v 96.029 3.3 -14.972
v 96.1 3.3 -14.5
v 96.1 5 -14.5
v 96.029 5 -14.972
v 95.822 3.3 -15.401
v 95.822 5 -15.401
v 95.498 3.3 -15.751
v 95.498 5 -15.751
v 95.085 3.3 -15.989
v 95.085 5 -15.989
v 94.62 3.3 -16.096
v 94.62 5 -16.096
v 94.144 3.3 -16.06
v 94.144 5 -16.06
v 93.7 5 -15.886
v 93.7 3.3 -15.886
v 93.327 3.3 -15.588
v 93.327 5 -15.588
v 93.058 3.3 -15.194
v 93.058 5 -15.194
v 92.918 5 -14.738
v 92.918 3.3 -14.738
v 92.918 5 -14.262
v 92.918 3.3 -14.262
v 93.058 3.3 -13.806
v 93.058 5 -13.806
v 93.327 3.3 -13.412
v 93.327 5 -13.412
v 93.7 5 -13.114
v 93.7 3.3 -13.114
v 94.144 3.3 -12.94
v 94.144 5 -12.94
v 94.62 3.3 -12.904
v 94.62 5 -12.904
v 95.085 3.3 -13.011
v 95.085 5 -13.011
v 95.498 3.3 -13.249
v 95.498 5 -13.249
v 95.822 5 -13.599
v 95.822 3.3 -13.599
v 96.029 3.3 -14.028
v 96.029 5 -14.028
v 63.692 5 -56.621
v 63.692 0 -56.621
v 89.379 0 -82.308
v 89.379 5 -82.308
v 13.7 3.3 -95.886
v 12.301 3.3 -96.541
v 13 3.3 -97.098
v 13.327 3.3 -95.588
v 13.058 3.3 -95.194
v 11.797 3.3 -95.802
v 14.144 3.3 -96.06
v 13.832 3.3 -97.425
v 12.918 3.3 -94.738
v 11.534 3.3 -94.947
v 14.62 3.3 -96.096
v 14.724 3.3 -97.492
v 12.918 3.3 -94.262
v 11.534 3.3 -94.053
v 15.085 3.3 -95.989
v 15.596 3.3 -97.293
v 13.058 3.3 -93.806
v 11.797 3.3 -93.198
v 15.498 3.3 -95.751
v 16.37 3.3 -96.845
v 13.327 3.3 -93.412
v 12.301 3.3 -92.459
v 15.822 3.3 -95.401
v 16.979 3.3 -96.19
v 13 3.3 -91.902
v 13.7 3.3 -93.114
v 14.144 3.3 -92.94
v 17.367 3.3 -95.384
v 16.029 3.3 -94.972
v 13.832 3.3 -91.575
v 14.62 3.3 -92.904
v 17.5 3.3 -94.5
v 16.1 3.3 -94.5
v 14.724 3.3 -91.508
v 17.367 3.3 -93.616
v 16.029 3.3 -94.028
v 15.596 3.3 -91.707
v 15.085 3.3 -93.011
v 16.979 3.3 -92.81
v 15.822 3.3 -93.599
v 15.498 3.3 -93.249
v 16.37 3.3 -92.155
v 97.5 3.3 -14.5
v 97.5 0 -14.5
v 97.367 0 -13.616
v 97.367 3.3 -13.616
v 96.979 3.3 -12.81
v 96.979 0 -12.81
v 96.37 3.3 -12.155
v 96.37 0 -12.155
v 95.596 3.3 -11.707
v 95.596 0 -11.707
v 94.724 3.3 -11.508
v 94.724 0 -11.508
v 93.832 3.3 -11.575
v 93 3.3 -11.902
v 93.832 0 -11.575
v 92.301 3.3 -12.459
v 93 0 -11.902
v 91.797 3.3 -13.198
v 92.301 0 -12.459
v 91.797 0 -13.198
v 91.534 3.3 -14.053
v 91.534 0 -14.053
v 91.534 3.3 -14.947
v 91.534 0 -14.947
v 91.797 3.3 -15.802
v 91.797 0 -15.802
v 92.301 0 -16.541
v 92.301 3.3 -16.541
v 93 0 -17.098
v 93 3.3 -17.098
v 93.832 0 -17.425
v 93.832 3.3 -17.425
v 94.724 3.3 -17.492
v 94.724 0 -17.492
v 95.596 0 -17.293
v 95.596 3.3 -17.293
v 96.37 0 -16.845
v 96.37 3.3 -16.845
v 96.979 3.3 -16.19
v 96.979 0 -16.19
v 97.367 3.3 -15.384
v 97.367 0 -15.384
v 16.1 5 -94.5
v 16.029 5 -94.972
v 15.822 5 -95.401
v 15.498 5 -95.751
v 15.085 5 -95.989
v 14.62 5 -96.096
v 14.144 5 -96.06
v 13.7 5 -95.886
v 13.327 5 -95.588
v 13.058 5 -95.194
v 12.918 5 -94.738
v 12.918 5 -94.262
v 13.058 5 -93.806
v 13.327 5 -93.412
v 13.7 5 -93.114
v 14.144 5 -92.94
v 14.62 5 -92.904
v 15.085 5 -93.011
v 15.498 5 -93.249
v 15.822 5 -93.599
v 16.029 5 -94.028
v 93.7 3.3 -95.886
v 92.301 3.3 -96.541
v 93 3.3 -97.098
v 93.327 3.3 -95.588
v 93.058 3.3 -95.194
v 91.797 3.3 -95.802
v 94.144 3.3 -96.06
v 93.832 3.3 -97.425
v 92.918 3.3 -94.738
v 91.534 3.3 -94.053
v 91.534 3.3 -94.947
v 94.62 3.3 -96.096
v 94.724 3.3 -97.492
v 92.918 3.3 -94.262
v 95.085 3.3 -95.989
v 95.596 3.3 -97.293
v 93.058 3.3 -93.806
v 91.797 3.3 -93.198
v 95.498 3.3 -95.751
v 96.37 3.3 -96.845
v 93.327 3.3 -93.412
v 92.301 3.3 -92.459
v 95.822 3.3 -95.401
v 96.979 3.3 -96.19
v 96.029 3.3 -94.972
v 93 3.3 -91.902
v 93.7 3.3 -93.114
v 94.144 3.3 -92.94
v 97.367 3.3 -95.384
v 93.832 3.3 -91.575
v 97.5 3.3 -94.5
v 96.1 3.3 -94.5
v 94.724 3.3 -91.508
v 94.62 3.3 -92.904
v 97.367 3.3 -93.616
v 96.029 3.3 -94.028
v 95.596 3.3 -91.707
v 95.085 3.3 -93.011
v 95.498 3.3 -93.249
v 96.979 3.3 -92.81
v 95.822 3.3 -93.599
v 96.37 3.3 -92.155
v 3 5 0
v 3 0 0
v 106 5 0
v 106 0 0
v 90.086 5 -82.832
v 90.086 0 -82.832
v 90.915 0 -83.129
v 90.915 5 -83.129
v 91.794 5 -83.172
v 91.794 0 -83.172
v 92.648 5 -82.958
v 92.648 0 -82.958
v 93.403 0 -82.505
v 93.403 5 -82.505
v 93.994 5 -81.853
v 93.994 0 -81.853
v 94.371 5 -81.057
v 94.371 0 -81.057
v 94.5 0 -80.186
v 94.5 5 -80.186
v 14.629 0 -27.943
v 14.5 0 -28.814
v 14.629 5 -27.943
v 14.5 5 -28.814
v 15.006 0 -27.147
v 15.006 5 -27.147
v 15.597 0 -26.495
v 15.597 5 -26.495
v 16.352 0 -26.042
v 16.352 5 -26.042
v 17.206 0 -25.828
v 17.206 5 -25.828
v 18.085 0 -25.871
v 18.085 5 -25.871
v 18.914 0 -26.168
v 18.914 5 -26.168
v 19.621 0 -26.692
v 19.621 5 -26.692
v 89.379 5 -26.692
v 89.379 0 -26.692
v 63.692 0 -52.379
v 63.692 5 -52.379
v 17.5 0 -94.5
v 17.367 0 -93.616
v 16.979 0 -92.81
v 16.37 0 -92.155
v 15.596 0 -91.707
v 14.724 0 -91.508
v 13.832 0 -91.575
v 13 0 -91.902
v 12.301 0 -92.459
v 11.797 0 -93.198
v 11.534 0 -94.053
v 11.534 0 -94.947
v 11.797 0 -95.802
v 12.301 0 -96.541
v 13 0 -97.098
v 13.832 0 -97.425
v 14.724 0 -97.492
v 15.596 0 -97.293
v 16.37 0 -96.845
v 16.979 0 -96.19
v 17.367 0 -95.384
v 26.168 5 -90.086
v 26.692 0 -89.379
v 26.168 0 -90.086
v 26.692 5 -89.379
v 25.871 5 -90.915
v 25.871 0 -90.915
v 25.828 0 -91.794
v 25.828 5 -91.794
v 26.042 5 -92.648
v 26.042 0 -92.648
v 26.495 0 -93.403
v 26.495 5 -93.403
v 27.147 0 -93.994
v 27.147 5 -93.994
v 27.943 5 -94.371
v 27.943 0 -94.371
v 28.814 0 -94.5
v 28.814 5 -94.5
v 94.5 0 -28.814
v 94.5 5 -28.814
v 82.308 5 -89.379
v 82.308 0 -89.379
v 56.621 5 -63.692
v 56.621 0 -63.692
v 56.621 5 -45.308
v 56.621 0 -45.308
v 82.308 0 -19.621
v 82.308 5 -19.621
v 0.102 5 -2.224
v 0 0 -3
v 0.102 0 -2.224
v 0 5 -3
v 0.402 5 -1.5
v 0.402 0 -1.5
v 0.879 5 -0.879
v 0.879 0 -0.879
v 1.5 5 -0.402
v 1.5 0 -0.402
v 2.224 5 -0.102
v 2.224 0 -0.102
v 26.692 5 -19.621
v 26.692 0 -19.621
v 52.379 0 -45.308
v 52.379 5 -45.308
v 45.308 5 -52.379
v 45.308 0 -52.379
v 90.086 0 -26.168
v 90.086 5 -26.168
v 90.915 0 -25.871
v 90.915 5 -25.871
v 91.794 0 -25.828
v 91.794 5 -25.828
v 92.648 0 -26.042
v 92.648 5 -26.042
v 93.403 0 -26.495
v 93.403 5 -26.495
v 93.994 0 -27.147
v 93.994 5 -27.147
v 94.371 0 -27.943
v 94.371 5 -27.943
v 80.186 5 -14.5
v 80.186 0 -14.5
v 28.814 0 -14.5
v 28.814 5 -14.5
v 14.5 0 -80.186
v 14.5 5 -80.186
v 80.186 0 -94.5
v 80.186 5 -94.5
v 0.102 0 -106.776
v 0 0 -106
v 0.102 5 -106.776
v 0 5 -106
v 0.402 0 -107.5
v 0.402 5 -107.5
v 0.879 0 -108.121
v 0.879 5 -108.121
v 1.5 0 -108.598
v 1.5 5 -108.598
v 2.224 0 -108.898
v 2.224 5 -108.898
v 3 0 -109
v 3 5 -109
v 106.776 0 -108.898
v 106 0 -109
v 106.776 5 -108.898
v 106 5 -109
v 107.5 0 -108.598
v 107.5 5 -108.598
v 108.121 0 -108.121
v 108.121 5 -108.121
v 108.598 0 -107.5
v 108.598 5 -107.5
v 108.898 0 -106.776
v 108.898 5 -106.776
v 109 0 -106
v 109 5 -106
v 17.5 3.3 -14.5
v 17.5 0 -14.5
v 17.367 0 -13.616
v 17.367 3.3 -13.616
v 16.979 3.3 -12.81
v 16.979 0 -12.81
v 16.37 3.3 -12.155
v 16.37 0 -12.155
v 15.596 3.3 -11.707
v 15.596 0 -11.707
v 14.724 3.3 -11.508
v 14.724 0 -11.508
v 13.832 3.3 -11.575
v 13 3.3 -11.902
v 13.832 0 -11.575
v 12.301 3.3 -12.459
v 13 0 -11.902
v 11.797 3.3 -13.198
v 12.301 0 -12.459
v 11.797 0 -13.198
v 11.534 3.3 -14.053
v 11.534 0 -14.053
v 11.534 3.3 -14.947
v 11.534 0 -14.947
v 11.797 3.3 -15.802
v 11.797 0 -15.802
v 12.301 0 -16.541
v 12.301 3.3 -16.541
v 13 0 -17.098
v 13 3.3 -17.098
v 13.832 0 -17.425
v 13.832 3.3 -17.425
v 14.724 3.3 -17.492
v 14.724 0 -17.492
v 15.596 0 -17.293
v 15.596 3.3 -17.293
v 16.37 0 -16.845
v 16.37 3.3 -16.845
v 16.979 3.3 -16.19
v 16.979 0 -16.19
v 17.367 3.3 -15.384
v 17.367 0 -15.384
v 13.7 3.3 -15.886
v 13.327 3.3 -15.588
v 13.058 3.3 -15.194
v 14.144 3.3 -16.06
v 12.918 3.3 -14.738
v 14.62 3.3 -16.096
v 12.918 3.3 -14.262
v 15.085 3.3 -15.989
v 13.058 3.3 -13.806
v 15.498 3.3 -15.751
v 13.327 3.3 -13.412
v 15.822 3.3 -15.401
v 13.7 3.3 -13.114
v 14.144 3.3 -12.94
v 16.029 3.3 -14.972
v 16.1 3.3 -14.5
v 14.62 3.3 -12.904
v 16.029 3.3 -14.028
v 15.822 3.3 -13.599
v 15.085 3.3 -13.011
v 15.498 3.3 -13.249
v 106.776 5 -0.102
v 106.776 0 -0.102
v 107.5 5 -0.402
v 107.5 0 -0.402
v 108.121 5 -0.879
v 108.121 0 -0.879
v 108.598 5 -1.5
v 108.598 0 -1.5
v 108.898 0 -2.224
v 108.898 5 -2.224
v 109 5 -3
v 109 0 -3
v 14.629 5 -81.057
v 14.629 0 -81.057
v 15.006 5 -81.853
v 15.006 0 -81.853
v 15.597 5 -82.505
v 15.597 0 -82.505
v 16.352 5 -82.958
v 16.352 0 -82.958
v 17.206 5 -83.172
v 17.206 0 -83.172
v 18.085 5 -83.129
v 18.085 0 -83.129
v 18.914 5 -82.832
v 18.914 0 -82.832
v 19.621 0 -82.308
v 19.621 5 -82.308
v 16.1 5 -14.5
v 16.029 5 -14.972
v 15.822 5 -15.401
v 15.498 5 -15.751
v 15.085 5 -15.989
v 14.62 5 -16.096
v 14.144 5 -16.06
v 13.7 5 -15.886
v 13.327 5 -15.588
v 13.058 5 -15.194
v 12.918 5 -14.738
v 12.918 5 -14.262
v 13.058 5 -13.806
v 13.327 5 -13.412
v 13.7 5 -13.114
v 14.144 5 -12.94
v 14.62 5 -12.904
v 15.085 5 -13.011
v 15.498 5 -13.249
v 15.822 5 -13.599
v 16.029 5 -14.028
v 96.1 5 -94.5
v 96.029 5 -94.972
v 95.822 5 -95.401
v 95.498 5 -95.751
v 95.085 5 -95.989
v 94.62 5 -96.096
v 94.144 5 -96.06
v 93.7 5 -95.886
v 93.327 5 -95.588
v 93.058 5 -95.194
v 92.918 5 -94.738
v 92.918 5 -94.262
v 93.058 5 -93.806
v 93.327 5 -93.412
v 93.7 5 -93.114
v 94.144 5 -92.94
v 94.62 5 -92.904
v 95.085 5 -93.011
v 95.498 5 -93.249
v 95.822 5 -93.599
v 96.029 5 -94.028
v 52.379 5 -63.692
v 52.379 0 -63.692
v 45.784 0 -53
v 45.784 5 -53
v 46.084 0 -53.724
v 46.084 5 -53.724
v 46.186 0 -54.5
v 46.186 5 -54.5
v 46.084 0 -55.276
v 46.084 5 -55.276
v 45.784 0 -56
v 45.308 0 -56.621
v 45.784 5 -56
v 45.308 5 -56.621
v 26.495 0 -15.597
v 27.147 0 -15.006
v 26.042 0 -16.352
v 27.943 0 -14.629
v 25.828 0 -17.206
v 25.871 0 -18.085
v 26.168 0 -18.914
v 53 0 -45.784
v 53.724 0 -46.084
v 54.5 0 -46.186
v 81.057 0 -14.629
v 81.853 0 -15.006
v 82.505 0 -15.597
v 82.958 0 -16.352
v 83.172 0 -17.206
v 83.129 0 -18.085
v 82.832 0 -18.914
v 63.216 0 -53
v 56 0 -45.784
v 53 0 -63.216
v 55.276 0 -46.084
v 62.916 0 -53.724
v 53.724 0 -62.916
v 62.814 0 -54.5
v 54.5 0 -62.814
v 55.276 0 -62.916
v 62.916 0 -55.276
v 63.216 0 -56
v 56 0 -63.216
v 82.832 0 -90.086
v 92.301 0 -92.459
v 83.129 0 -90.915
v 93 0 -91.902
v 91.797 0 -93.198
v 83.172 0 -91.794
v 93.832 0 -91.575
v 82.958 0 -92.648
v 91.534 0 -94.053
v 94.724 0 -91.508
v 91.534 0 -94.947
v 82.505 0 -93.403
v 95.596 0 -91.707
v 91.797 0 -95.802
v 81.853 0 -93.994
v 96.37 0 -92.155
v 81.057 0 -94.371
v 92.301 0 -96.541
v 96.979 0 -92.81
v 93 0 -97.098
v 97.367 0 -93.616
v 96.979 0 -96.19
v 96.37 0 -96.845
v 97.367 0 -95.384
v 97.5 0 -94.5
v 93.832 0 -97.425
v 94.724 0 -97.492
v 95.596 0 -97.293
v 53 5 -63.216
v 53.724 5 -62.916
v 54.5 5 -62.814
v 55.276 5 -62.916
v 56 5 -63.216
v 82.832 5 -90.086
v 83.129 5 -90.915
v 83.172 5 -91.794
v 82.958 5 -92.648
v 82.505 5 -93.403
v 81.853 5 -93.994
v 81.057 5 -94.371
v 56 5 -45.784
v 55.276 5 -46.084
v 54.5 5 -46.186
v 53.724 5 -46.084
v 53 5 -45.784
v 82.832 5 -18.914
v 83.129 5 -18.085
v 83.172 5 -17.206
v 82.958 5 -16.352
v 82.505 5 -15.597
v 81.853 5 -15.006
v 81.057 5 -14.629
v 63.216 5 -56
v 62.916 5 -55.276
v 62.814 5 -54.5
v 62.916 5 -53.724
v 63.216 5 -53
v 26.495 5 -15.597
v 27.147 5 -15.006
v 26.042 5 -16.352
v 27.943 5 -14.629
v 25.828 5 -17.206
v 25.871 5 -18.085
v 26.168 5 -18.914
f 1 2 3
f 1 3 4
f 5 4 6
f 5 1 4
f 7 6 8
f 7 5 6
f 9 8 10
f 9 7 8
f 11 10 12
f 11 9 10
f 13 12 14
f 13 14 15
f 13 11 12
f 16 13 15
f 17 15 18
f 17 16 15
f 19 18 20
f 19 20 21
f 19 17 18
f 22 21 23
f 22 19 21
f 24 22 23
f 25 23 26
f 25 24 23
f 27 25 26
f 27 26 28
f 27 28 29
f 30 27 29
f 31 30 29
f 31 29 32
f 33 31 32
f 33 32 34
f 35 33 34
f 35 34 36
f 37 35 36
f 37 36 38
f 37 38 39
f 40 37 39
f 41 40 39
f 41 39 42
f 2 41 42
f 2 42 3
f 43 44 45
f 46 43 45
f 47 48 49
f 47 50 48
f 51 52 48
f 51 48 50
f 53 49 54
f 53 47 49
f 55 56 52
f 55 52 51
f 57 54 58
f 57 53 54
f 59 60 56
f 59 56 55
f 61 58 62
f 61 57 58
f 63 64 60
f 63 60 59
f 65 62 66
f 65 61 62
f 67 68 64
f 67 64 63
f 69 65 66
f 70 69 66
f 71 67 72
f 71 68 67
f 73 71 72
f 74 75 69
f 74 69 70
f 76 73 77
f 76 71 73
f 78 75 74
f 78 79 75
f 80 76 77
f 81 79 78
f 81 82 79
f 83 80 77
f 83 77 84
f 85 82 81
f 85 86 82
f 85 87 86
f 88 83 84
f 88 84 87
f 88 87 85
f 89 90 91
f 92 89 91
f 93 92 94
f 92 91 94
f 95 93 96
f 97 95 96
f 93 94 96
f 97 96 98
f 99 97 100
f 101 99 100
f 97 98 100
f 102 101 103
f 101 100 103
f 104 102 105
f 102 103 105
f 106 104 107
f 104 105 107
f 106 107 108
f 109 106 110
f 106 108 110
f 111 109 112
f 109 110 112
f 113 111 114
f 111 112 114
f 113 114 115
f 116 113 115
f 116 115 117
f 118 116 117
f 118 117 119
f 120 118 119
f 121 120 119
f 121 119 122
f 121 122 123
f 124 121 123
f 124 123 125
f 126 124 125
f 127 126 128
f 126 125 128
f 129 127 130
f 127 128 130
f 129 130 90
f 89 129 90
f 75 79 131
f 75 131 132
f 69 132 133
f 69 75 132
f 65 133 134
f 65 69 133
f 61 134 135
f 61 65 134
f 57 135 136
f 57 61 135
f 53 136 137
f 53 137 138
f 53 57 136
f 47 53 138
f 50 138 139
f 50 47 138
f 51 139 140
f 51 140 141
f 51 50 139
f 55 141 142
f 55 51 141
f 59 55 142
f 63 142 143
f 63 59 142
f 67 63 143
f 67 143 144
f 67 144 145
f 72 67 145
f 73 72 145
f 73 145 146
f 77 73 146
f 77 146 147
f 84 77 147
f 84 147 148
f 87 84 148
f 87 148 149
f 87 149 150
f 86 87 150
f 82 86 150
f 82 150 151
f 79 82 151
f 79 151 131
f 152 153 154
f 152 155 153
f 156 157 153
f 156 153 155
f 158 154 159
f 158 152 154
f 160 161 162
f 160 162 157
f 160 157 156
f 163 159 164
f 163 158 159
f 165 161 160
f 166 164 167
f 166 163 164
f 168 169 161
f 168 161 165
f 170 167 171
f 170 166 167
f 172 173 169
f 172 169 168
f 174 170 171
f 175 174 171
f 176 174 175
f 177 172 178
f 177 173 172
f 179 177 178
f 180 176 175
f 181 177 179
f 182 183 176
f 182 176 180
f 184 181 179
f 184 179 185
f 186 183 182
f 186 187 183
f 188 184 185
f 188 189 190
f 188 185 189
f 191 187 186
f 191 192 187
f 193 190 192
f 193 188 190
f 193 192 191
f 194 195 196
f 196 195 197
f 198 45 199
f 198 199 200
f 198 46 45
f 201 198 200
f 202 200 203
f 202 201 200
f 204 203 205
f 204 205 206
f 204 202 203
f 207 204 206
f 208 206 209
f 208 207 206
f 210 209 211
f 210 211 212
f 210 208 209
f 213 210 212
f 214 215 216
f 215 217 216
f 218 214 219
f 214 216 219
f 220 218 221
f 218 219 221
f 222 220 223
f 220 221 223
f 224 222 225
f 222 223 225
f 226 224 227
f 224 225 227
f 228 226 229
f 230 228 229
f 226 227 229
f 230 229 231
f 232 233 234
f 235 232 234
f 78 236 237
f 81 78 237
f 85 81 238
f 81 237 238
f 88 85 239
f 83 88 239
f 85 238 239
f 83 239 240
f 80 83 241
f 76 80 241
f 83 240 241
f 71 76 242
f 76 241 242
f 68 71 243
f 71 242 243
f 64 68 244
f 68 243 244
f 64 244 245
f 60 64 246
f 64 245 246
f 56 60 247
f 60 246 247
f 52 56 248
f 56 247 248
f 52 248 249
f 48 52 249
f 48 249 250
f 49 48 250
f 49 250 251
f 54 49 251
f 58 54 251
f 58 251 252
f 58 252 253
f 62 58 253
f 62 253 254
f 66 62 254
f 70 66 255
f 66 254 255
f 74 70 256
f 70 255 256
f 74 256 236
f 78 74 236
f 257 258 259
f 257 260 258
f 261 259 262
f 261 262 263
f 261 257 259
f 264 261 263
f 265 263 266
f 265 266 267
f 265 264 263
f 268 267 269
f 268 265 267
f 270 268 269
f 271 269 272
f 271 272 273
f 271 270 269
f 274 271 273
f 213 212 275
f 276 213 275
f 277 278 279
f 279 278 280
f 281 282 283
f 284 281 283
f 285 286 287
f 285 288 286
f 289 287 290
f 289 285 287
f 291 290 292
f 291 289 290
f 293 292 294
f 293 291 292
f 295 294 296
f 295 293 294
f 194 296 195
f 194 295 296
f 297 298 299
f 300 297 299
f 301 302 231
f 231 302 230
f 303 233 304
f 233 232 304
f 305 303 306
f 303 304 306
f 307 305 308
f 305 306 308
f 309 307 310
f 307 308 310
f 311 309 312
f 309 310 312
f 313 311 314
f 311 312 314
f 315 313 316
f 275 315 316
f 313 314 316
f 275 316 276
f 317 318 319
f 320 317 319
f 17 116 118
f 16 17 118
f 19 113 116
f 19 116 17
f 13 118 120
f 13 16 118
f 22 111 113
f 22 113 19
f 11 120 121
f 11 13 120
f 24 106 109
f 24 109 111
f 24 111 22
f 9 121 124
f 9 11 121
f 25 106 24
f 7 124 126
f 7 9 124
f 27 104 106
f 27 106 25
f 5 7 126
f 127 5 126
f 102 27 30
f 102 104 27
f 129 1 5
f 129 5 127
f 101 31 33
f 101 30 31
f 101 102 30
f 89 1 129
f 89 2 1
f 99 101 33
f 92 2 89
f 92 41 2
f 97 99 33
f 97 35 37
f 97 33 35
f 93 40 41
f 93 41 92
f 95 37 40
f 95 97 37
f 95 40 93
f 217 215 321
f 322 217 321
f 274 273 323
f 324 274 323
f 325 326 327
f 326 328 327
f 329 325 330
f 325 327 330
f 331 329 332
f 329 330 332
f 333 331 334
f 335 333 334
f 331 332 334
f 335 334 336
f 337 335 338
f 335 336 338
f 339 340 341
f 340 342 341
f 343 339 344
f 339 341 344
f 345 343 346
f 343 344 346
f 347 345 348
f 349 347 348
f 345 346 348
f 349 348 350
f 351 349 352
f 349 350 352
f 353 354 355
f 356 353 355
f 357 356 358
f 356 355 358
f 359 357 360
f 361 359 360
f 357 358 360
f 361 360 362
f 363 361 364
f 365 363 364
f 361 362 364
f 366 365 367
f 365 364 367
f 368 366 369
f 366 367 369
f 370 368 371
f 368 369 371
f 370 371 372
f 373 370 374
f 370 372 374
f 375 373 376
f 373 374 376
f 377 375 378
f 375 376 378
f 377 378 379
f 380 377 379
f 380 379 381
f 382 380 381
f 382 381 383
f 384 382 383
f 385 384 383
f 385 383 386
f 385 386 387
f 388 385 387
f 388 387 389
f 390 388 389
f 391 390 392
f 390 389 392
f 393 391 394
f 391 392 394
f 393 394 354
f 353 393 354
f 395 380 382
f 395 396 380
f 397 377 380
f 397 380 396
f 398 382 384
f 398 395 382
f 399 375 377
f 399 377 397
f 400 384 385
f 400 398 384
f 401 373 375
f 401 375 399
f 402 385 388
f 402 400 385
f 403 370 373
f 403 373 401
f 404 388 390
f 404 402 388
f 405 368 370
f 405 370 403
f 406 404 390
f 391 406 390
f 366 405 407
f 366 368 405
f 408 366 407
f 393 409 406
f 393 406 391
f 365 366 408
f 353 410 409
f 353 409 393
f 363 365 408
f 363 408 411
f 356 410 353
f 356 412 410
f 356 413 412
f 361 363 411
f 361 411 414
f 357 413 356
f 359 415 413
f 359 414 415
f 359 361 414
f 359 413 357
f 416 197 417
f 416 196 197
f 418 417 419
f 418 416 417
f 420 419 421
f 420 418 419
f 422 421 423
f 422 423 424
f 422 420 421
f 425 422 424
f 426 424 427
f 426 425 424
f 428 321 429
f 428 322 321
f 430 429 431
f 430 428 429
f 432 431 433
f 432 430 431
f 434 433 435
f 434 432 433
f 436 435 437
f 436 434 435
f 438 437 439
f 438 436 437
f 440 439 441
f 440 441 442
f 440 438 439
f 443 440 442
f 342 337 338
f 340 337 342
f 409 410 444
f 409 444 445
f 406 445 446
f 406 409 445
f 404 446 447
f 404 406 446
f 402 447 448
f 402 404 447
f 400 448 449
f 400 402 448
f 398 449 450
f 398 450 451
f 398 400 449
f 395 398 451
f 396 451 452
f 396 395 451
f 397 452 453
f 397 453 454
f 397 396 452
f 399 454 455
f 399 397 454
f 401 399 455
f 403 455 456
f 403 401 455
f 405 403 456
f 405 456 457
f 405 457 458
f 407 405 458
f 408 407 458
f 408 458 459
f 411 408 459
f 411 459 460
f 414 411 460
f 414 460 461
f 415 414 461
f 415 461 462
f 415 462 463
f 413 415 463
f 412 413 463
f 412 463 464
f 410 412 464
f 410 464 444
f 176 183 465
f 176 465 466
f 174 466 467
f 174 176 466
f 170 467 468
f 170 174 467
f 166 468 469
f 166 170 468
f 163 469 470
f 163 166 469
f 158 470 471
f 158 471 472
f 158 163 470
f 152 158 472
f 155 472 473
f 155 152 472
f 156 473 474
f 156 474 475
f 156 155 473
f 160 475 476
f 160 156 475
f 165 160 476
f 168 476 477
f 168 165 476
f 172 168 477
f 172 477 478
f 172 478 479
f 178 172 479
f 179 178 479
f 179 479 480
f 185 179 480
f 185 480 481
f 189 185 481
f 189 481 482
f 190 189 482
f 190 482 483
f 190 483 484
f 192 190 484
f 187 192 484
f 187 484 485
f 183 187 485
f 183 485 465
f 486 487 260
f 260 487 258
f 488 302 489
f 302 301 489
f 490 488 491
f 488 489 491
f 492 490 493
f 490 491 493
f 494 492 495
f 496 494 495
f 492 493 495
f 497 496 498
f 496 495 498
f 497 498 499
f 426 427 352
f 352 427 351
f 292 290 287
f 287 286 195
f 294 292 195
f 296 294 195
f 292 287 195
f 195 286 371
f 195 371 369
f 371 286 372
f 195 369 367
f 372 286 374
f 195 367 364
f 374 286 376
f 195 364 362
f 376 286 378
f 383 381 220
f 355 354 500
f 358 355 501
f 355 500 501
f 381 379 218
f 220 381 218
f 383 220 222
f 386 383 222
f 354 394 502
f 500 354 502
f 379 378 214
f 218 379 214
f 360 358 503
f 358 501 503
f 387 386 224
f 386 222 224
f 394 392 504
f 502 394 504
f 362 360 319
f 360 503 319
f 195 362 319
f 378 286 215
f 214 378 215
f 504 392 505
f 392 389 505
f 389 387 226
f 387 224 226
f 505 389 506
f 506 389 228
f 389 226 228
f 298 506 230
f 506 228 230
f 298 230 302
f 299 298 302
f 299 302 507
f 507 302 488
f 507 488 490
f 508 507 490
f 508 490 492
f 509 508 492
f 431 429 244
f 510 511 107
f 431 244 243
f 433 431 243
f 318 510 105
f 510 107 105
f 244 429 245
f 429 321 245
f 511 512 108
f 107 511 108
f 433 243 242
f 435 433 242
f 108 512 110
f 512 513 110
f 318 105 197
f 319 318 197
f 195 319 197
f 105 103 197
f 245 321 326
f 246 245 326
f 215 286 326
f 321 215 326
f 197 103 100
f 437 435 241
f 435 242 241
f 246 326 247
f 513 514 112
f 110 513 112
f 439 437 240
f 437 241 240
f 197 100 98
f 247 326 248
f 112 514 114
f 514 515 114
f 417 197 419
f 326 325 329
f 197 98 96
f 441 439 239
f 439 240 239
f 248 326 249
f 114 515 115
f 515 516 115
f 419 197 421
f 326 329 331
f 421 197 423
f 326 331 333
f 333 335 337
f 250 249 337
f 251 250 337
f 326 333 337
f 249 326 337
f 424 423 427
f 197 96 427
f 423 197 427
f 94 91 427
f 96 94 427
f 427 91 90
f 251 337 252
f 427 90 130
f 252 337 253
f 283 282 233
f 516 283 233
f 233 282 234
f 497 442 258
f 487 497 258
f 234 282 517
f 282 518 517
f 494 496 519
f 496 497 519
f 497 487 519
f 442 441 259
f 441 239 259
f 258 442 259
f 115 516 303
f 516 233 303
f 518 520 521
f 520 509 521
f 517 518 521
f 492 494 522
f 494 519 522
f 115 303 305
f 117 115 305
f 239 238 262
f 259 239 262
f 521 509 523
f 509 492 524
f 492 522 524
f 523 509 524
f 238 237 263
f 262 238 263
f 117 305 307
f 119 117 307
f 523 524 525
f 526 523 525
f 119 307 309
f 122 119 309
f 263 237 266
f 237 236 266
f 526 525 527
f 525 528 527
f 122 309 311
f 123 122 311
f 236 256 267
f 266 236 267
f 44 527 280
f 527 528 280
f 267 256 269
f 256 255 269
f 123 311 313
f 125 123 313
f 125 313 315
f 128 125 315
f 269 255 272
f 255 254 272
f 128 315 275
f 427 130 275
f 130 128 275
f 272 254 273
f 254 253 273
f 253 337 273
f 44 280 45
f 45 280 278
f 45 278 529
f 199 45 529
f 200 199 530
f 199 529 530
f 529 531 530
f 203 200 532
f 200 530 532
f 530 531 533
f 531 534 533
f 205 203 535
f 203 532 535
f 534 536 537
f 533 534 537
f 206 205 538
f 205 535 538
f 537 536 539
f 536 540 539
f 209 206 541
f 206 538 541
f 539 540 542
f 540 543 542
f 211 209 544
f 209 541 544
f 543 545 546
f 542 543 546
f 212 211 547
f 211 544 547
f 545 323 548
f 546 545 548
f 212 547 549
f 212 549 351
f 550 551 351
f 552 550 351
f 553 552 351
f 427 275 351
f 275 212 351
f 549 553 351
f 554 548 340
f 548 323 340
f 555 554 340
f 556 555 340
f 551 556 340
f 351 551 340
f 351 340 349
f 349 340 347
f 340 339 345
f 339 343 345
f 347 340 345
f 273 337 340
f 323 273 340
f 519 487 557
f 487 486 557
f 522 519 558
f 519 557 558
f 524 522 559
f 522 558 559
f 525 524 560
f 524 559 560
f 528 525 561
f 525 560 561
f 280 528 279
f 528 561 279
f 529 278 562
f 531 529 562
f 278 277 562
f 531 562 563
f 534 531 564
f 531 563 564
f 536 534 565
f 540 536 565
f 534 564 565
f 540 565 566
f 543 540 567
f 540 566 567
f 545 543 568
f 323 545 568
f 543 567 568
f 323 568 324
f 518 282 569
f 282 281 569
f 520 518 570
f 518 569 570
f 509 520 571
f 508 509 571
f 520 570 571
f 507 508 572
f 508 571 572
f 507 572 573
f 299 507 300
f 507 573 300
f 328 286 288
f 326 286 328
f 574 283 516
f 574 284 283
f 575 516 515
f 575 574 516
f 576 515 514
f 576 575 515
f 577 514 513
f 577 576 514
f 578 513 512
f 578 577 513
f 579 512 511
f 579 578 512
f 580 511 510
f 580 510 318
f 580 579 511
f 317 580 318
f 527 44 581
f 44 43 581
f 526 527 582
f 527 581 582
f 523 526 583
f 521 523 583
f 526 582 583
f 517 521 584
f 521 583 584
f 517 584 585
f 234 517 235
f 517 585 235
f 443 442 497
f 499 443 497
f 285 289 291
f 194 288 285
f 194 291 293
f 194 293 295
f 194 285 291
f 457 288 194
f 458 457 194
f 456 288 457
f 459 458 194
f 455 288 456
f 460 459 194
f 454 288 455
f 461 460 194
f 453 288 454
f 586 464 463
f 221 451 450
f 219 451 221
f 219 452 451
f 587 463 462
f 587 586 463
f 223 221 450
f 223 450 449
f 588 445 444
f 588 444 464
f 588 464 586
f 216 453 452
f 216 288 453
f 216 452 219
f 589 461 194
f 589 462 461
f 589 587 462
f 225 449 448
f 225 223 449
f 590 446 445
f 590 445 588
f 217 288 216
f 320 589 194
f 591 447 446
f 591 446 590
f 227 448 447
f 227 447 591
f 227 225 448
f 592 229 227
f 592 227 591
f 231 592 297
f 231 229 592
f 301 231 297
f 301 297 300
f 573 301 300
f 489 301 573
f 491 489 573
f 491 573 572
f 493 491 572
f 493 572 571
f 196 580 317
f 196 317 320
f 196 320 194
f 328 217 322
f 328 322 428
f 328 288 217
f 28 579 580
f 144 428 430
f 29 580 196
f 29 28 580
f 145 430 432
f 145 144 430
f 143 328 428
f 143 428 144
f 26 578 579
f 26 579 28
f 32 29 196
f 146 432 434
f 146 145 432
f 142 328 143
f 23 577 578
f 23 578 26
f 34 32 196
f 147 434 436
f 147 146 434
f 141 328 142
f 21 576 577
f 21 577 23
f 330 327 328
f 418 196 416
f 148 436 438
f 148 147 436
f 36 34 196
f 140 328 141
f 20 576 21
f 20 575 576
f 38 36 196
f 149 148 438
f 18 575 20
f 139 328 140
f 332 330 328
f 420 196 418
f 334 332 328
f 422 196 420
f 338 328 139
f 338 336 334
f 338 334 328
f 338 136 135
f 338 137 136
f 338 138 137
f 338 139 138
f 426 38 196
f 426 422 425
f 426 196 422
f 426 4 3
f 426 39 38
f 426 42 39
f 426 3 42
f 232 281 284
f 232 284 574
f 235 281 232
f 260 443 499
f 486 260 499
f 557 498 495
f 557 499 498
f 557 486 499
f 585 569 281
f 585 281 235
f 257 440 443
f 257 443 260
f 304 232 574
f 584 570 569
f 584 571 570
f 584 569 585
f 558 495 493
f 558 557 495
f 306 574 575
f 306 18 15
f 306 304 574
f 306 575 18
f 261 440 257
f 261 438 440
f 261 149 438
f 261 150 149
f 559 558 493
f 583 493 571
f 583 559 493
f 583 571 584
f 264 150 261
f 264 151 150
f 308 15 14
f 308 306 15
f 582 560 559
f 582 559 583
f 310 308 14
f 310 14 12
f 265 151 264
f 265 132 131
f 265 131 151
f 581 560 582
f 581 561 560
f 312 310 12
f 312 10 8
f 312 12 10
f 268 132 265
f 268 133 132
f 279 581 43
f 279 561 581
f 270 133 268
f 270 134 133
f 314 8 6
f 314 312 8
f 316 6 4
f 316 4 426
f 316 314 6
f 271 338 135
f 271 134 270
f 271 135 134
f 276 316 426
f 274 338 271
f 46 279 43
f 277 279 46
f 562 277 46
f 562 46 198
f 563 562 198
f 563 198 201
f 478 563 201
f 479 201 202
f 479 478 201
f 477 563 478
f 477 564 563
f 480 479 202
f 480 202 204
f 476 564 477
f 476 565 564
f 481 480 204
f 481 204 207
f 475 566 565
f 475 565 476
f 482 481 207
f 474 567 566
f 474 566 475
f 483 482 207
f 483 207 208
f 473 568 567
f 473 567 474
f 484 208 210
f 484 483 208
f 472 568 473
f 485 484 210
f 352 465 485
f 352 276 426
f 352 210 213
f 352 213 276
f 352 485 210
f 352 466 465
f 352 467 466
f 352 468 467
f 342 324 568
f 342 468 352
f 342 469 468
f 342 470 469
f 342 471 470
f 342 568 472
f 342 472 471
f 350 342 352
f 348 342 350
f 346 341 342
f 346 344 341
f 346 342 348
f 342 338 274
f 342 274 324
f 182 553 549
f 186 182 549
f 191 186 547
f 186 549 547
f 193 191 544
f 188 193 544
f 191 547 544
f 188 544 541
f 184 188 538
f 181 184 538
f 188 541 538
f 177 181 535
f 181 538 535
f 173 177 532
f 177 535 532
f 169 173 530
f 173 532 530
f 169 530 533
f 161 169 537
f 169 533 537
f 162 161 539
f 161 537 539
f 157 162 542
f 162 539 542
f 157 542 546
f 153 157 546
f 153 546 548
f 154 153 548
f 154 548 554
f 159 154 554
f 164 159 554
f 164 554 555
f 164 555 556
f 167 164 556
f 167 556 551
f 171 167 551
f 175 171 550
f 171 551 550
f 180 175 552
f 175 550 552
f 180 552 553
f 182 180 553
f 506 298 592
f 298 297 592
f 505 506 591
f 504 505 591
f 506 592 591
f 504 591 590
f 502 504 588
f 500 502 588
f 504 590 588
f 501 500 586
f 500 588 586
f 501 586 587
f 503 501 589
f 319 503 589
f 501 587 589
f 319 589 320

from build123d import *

# Parameters (mm, degrees)
SKETCH_1_W          = 109
SKETCH_1_H          = 109
SKETCH_1_R          = 1.6
EXTRUDE_2_DEPTH     = 5
FILLET_1_R          = 3
SKETCH_2_R          = 3
CUT_EXTRUDE_1_DEPTH = 3.3


with BuildPart() as part:
    # 草图1 → 凸台-拉伸2 (new body)
    with BuildSketch(Plane(origin=(0, 0, 0), x_dir=(1, 0, 0), z_dir=(0, 1, 0))):
        with Locations((54.5, 54.5)):
            Rectangle(SKETCH_1_W, SKETCH_1_H)
        with Locations((14.5, 94.5)):
            Circle(SKETCH_1_R, mode=Mode.SUBTRACT)
        with Locations((94.5, 94.5)):
            Circle(SKETCH_1_R, mode=Mode.SUBTRACT)
        with Locations((94.5, 14.5)):
            Circle(SKETCH_1_R, mode=Mode.SUBTRACT)
        with Locations((14.5, 14.5)):
            Circle(SKETCH_1_R, mode=Mode.SUBTRACT)
        Polygon((14.5, 87.428932188), (47.428932188, 54.5), (14.5, 21.571067812), align=None, mode=Mode.SUBTRACT)
        Polygon((21.571067812, 94.5), (87.428932188, 94.5), (54.5, 61.571067812), align=None, mode=Mode.SUBTRACT)
        Polygon((94.5, 87.428932188), (94.5, 21.571067812), (61.571067812, 54.5), align=None, mode=Mode.SUBTRACT)
        Polygon((87.428932188, 14.5), (21.571067812, 14.5), (54.5, 47.428932188), align=None, mode=Mode.SUBTRACT)
    extrude(amount=EXTRUDE_2_DEPTH)

    # 圆角1
    fillet_1_edges = [part.edges().sort_by_distance(p)[0] for p in [
        (14.5, 2.5, -87.428932188),
        (14.5, 2.5, -21.571067812),
        (47.428932188, 2.5, -54.5),
        (54.5, 2.5, -61.571067812),
        (87.428932188, 2.5, -94.5),
        (21.571067812, 2.5, -94.5),
        (61.571067812, 2.5, -54.5),
        (94.5, 2.5, -21.571067812),
        (94.5, 2.5, -87.428932188),
        (54.5, 2.5, -47.428932188),
        (21.571067812, 2.5, -14.5),
        (87.428932188, 2.5, -14.5),
        (0, 2.5, -109),
        (109, 2.5, -109),
        (109, 2.5, 0),
        (0, 2.5, 0),
    ]]
    fillet(fillet_1_edges, radius=FILLET_1_R)

    # 草图2 → 切除-拉伸1 (cut)
    with BuildSketch(Plane.XZ):
        with Locations((14.5, -14.5)):
            Circle(SKETCH_2_R)
        with Locations((94.5, -14.5)):
            Circle(SKETCH_2_R)
        with Locations((94.5, -94.5)):
            Circle(SKETCH_2_R)
        with Locations((14.5, -94.5)):
            Circle(SKETCH_2_R)
    extrude(amount=-CUT_EXTRUDE_1_DEPTH, mode=Mode.SUBTRACT)


solid = part.part
